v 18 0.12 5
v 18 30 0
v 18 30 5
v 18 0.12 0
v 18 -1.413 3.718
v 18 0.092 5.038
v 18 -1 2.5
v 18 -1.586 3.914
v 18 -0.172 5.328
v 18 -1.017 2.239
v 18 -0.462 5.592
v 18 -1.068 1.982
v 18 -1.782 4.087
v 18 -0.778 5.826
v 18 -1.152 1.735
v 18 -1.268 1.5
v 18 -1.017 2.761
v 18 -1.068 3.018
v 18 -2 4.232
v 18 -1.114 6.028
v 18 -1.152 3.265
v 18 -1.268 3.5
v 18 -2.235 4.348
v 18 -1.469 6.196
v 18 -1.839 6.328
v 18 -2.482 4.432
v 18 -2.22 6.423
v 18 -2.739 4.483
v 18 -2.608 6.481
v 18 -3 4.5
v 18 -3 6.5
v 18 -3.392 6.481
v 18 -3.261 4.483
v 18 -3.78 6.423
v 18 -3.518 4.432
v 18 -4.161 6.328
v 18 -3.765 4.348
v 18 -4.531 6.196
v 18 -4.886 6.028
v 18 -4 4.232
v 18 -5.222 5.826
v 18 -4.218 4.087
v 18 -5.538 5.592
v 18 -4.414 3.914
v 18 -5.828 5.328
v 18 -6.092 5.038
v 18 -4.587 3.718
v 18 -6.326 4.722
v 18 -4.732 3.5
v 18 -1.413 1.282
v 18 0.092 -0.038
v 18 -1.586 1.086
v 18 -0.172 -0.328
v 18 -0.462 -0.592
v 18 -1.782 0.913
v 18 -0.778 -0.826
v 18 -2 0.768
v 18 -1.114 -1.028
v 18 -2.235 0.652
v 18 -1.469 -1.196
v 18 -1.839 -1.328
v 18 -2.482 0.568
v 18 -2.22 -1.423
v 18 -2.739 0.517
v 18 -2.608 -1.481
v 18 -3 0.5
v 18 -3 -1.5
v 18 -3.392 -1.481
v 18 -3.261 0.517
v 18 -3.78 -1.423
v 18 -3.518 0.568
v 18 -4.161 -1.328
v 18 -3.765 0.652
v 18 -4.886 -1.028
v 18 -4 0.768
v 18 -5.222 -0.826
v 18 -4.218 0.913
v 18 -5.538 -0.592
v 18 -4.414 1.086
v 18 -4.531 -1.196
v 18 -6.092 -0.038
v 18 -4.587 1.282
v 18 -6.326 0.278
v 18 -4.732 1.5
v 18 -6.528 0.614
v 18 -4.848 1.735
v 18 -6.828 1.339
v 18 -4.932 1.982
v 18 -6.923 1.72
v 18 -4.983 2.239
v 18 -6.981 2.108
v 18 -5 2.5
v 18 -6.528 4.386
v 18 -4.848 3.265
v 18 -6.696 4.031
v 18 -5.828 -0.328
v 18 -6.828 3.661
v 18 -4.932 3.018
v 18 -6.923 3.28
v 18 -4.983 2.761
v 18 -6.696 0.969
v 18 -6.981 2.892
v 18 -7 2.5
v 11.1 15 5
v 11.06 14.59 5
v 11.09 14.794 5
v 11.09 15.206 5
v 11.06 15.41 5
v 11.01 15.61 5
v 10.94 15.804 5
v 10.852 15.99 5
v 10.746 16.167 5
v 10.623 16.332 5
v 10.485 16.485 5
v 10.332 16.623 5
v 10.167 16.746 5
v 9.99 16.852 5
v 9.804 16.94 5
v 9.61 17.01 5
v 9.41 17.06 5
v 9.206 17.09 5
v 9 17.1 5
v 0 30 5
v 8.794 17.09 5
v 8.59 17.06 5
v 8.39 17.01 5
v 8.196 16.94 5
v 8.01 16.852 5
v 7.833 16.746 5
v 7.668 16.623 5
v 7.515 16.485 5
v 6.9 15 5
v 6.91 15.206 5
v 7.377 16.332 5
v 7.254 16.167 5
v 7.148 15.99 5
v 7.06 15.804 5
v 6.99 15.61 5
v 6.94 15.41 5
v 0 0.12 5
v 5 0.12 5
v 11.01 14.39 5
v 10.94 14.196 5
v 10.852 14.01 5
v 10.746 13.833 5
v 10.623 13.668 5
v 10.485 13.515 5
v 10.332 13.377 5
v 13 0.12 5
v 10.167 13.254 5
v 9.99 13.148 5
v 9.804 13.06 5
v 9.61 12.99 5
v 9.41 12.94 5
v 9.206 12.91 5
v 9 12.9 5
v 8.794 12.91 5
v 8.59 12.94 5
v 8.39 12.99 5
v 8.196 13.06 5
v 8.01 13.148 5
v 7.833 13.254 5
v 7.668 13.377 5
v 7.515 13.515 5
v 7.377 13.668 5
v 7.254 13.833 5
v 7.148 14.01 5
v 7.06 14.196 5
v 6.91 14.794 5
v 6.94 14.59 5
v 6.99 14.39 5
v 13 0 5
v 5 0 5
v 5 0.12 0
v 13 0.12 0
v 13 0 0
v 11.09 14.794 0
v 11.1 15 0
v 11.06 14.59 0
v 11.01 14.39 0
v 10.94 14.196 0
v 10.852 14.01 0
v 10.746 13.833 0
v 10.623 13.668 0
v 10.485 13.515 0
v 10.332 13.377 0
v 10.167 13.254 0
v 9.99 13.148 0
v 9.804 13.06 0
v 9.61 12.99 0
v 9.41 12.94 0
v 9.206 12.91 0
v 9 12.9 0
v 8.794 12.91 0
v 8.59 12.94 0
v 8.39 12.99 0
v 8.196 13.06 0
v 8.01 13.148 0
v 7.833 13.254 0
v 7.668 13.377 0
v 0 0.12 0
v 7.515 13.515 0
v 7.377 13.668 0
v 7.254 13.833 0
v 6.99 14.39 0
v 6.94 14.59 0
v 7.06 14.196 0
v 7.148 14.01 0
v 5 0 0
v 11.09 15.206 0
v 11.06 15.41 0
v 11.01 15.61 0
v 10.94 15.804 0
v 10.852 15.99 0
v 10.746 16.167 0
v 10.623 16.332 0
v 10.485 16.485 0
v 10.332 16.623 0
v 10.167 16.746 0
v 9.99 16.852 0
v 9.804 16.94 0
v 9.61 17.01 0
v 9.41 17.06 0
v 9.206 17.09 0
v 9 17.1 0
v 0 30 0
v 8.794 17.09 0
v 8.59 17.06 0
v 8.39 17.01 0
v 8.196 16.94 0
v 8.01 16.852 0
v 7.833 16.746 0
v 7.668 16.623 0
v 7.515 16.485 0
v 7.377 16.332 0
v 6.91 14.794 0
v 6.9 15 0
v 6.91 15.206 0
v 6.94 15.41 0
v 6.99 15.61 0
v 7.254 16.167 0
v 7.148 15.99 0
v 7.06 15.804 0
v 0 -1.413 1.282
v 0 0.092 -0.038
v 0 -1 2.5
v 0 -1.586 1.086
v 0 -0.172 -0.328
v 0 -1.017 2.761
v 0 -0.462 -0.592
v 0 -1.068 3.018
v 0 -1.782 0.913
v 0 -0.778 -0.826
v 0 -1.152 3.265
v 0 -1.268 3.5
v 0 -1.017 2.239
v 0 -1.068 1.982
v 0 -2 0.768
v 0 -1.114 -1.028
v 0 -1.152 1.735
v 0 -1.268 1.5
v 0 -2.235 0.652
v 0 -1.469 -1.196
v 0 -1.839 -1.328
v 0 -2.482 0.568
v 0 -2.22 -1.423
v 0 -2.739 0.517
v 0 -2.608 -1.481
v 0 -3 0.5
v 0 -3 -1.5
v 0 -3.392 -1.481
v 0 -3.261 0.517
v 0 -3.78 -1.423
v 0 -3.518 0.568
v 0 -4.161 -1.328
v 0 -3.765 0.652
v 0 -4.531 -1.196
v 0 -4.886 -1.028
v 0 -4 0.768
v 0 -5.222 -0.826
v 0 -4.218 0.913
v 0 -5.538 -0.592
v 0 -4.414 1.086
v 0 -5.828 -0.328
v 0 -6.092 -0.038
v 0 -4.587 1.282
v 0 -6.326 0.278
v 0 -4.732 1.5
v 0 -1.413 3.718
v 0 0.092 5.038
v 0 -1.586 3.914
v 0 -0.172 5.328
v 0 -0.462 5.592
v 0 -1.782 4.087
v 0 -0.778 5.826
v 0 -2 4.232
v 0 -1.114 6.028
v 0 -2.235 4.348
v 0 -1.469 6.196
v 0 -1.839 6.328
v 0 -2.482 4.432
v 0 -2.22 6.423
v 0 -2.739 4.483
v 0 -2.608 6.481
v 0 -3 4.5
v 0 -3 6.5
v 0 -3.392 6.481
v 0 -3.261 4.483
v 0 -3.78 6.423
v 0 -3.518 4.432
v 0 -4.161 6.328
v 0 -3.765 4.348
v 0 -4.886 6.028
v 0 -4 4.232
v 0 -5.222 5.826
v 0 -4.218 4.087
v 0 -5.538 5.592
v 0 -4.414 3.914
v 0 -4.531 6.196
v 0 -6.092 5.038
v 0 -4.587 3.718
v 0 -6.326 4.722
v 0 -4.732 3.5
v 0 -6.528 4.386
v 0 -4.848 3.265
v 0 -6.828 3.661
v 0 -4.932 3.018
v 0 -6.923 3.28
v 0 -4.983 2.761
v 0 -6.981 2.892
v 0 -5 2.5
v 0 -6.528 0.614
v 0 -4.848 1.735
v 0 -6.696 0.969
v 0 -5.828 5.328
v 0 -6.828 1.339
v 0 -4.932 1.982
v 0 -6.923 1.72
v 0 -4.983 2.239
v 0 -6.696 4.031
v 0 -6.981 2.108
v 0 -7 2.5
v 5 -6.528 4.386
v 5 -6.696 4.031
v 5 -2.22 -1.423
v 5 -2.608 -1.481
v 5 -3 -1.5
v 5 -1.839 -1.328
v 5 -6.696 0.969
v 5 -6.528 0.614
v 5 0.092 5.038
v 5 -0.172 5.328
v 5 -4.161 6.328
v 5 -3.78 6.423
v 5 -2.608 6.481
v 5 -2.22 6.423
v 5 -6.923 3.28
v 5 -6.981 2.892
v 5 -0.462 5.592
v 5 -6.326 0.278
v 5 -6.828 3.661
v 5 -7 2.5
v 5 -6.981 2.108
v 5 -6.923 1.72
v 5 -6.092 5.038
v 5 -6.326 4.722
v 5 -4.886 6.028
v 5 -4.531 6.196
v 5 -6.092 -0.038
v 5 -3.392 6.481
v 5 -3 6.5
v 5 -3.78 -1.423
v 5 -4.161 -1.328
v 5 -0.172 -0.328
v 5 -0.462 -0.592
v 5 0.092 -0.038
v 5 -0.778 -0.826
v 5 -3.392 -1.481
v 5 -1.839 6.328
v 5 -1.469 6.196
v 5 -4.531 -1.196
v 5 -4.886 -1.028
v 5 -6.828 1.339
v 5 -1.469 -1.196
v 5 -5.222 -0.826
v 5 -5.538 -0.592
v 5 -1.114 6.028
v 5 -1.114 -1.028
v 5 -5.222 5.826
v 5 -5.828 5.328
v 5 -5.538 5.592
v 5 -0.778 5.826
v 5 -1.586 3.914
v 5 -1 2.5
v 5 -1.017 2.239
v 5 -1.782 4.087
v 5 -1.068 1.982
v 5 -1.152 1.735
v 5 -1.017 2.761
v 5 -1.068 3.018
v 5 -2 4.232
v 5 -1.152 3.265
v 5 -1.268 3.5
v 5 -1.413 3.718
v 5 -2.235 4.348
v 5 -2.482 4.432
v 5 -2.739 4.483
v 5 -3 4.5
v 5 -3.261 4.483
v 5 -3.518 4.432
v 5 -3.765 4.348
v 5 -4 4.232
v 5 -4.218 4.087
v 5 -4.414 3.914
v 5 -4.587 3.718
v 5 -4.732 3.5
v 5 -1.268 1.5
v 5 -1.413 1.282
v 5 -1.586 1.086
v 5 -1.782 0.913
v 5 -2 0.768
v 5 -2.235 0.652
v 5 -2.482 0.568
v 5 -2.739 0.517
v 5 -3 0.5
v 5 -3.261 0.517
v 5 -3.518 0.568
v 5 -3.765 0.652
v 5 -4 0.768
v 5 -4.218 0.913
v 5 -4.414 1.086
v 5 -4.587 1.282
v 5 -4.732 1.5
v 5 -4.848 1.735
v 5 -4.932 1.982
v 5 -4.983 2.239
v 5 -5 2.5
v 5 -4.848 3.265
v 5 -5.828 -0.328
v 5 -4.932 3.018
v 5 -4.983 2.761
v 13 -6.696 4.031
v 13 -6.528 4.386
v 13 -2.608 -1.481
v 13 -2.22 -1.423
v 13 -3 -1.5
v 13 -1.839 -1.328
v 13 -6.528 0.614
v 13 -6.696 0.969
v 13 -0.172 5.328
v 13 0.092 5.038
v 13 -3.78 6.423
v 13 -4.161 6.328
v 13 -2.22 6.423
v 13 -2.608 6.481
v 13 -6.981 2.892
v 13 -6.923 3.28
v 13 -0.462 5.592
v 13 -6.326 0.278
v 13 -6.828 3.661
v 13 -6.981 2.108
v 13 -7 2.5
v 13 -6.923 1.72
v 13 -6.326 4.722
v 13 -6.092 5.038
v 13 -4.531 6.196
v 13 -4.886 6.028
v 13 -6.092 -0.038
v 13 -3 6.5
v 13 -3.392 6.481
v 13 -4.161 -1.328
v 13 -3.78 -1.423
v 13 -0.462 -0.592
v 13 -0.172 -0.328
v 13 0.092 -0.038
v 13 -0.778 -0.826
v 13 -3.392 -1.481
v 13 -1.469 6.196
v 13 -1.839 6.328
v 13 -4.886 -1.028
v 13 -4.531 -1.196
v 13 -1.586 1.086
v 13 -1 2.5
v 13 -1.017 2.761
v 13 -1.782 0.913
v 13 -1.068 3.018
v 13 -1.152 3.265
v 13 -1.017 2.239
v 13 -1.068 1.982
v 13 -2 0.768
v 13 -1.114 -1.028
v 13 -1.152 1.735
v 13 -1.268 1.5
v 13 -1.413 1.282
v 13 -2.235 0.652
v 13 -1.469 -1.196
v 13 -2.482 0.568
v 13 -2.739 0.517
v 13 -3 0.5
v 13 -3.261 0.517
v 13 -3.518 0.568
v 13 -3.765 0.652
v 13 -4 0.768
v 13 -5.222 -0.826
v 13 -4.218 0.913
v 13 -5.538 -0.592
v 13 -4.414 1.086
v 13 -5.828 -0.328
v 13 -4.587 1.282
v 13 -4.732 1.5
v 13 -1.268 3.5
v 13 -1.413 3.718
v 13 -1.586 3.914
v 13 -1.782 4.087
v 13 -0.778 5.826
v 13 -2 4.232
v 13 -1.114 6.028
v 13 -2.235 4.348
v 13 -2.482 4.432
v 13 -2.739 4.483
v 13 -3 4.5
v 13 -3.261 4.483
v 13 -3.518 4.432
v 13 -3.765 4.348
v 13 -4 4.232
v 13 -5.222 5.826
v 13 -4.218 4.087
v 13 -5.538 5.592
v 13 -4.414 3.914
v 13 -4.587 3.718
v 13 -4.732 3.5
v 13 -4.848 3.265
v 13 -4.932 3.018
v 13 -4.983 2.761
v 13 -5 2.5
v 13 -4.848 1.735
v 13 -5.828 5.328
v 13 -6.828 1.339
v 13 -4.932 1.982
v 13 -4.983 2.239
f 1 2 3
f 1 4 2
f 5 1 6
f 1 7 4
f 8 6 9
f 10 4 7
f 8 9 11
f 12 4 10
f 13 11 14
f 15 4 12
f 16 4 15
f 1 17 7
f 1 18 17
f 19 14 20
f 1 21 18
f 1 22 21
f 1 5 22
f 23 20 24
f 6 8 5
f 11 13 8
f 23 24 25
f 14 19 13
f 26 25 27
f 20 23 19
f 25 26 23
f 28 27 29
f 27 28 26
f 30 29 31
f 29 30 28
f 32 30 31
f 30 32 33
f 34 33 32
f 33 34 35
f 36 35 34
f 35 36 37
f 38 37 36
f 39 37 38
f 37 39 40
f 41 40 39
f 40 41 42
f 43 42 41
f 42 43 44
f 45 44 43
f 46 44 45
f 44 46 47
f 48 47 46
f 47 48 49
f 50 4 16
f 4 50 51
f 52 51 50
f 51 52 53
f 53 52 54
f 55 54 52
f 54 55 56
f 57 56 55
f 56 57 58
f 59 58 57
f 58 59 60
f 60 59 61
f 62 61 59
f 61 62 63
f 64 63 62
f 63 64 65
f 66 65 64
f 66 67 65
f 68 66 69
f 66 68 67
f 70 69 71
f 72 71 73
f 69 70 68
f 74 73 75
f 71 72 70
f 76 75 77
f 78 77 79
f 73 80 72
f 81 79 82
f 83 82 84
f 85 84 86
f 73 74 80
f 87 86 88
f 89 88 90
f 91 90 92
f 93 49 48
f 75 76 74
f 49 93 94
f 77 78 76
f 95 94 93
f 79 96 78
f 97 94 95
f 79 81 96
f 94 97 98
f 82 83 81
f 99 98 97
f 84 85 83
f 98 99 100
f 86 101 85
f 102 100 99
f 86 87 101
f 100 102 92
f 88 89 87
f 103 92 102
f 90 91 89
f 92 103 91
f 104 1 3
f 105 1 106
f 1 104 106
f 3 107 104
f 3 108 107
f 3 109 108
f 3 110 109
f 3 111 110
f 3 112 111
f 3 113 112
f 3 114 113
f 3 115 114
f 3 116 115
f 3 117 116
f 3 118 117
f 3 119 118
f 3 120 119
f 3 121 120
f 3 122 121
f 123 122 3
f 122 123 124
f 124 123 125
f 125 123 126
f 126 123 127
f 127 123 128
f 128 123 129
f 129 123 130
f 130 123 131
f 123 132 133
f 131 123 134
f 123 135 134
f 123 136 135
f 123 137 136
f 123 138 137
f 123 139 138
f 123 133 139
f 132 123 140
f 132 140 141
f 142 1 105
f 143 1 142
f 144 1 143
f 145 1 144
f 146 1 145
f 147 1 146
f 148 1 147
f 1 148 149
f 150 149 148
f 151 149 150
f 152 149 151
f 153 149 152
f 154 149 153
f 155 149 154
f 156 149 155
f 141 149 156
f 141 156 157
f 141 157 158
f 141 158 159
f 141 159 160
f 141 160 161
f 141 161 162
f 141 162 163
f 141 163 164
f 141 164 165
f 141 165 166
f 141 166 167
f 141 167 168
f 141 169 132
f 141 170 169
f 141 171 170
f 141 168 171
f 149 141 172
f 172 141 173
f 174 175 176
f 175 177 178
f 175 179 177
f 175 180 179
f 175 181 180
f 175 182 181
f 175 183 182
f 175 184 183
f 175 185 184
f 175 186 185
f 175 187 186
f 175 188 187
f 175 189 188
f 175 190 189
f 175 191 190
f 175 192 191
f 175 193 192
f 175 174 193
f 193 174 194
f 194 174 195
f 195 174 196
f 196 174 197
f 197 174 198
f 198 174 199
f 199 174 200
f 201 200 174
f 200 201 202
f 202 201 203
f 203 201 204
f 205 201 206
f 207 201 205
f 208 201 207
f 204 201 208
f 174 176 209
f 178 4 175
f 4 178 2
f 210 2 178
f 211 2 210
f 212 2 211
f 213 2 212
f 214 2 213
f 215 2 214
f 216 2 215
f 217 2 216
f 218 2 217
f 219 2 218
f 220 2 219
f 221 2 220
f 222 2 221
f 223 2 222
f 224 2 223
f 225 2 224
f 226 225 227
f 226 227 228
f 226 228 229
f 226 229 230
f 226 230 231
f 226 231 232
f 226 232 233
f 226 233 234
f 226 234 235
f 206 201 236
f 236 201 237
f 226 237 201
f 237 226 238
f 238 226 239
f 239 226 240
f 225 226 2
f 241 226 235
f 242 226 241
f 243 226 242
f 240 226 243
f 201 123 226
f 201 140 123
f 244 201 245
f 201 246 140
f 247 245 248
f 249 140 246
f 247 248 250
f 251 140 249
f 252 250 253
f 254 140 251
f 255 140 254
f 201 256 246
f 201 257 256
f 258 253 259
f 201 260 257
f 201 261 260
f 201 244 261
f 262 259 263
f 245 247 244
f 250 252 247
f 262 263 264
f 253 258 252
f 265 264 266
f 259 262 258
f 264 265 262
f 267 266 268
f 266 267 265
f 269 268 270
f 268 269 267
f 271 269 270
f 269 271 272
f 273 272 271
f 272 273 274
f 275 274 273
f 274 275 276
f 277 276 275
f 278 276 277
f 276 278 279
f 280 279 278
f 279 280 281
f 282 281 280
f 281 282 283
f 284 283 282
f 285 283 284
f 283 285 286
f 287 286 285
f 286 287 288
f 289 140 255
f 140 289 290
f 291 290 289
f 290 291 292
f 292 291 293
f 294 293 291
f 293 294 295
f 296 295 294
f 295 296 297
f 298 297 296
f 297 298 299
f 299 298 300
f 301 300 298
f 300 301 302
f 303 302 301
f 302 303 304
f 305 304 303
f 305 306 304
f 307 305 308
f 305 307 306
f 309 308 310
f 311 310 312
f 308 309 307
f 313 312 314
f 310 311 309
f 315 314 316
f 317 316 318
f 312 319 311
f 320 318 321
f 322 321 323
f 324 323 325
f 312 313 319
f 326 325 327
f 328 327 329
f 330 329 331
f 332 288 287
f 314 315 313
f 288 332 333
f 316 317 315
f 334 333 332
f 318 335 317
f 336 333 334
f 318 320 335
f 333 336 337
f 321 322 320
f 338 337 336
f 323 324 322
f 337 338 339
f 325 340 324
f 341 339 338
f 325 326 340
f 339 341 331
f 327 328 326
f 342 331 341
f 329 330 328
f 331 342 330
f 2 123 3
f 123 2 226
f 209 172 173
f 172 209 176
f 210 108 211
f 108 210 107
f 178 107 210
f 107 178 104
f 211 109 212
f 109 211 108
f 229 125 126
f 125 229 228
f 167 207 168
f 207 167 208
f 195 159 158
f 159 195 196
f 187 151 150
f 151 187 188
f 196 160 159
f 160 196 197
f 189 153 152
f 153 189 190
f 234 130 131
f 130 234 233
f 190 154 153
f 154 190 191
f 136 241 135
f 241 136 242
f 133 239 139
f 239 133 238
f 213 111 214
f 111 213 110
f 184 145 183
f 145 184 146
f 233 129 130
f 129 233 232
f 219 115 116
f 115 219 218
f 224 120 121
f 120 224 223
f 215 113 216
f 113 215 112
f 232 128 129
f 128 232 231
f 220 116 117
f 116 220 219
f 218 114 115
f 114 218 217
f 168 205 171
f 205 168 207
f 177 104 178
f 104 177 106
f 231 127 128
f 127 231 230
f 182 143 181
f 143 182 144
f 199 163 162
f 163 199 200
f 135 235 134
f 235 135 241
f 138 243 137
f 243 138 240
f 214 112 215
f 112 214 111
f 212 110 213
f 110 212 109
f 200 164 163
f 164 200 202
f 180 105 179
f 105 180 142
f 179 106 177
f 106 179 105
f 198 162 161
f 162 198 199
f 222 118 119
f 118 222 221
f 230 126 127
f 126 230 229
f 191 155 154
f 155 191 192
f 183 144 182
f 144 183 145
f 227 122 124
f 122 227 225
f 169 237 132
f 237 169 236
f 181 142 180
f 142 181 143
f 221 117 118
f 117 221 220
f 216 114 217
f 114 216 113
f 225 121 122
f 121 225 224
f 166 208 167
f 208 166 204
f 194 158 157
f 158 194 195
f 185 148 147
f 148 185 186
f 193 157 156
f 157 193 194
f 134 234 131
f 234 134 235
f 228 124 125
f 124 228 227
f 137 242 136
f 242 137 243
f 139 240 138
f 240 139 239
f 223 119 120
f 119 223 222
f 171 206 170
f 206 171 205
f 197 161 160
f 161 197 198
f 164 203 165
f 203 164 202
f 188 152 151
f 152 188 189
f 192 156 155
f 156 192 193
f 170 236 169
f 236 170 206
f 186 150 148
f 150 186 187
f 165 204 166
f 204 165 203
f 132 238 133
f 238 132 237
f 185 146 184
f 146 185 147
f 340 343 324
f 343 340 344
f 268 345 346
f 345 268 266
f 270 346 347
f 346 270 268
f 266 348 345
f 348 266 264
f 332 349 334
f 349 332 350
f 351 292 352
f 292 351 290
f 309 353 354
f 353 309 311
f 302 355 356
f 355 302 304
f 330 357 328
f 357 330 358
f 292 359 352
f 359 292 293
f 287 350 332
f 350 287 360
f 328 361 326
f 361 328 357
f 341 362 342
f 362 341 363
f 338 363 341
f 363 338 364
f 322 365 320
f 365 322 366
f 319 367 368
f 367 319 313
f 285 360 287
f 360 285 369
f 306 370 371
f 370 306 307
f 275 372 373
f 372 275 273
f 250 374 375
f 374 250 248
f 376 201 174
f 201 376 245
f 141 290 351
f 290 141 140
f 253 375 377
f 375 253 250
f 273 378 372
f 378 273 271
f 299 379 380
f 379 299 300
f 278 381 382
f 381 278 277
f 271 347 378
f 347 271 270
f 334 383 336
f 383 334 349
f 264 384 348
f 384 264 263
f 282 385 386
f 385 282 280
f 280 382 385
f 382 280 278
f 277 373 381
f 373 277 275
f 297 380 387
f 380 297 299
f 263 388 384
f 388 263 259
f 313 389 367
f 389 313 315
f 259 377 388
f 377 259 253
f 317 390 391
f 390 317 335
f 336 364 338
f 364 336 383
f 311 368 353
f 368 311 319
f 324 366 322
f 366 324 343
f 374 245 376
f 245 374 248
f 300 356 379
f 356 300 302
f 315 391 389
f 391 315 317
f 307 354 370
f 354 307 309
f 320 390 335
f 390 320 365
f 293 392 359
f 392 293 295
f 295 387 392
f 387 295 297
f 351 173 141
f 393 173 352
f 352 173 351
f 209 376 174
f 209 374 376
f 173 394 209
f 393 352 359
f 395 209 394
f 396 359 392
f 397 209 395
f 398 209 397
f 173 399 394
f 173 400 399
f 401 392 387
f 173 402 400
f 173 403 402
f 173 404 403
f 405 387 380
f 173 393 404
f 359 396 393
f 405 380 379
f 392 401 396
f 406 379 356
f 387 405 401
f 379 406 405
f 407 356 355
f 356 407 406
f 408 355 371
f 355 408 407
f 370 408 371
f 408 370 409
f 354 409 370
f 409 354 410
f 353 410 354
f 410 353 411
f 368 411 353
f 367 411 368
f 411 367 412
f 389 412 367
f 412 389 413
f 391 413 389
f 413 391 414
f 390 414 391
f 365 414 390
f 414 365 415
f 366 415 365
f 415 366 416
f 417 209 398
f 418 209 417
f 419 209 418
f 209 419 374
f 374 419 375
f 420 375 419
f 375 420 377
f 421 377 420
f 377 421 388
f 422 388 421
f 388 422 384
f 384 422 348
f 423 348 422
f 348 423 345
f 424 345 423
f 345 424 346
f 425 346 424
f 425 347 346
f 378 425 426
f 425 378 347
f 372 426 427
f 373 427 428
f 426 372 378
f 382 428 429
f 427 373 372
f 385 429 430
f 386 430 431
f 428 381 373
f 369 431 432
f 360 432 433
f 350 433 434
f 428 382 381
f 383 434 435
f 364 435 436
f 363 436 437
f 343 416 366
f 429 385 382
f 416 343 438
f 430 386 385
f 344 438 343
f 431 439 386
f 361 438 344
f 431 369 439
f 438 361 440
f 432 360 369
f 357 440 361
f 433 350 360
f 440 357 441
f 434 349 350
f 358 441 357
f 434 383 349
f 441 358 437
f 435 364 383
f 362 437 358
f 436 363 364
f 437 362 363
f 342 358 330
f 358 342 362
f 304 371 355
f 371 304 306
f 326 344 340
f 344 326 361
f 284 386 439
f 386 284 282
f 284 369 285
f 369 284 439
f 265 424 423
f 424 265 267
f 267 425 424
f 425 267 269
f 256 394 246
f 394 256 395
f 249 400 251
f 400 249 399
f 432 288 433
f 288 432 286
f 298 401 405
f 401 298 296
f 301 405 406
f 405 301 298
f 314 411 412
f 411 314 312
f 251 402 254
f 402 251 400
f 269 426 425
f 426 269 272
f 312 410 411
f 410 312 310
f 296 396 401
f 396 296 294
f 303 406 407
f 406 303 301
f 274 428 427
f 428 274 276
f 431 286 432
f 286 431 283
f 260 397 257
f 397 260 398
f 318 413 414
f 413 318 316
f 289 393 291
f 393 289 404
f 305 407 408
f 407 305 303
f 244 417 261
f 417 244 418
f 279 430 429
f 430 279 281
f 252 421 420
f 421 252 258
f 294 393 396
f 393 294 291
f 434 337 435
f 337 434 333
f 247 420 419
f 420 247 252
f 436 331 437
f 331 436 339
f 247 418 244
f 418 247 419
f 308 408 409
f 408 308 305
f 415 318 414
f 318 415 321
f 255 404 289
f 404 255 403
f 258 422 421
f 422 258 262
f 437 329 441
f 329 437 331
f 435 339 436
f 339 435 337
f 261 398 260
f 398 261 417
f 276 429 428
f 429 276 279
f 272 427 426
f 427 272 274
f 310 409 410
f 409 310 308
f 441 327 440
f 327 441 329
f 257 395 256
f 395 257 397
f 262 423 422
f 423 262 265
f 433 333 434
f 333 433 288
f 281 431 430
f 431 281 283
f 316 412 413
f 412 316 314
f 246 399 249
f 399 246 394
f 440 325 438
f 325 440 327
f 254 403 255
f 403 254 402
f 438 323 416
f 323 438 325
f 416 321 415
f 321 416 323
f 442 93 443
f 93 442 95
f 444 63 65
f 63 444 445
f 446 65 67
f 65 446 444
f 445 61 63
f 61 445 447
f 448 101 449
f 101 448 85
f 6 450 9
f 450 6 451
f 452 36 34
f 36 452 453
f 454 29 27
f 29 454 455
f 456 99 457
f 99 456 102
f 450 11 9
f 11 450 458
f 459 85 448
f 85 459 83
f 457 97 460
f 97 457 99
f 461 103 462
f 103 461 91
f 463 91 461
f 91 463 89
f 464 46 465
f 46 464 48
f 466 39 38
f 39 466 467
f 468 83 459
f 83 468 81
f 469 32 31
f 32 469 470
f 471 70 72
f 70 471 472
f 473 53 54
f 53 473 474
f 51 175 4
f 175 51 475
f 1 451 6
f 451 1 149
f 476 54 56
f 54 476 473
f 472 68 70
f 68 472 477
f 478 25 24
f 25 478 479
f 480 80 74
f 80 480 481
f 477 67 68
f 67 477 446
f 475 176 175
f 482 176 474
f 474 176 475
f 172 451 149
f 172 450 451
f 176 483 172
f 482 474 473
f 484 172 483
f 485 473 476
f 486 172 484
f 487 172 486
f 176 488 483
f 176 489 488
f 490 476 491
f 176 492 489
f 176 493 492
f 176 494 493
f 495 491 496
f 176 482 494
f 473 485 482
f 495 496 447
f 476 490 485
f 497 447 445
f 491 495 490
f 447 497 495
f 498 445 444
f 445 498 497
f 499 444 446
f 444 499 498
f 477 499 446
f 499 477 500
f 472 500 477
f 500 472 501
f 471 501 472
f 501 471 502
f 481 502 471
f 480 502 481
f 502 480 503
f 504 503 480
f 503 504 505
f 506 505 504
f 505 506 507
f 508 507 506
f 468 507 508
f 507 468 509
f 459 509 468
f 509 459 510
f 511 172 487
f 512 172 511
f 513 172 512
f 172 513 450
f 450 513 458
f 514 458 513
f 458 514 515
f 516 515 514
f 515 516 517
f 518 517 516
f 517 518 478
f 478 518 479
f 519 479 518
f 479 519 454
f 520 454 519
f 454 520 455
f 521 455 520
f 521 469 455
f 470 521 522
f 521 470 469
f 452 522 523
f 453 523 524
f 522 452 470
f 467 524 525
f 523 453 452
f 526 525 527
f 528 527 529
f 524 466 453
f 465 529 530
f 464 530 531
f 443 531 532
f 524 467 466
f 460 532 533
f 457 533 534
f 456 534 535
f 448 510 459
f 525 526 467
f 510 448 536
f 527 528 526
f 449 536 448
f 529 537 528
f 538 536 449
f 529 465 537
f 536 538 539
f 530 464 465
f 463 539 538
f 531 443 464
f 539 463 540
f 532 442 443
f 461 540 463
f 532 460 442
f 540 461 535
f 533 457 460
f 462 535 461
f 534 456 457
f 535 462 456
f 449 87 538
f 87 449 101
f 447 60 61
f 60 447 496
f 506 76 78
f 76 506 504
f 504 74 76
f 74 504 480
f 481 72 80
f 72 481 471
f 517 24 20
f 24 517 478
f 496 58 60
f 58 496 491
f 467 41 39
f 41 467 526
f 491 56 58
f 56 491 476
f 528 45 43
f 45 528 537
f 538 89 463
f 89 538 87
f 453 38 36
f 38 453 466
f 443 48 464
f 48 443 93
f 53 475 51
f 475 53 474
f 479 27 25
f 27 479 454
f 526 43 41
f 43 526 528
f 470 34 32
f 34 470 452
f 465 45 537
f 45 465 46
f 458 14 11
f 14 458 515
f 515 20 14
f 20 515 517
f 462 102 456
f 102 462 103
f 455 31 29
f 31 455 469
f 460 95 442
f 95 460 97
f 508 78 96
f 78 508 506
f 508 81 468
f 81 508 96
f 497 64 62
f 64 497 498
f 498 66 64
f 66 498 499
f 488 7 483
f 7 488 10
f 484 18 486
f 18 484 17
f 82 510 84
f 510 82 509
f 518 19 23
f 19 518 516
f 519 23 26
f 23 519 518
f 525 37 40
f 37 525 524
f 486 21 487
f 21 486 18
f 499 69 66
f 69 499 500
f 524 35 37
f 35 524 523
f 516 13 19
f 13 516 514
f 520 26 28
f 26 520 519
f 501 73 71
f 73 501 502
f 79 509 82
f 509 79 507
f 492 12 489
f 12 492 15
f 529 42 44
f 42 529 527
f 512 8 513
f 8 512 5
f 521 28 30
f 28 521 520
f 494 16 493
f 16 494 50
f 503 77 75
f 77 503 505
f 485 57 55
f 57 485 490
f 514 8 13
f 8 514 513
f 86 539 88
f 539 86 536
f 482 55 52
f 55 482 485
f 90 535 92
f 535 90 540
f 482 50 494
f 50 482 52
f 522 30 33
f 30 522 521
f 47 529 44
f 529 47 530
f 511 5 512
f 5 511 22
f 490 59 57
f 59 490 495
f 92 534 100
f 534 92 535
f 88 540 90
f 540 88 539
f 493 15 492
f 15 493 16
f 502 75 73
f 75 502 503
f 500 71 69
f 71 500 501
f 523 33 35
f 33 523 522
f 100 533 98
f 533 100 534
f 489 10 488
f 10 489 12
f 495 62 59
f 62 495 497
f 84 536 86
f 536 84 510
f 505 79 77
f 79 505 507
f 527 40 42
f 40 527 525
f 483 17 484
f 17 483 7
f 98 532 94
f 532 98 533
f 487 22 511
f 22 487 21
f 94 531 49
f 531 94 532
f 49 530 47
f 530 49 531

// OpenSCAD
// --- Tấm phẳng 18x30mm, dày 5mm, có 1 lỗ M4 ở tâm và 2 khớp tròn có lỗ xuyên tâm ---
thickness = 5;
length = 18;
width = 30;
hole_dia = 4.2;       // lỗ bắt vít M4 (cho ốc lọt)
pin_dia = 4;        // lỗ xuyên tâm của khớp (cho đinh/pin)

// --- Thông số khớp ---
knuckle_dia = 8;      // đường kính ngoài khớp
knuckle_len = 5;      // chiều dài mỗi khớp (theo trục Y)
gap = 8;    // khoảng cách giữa 2 khớp = chiều dài khớp

// --- Tấm phẳng có 1 lỗ M4 ở giữa ---
difference() {
    cube([length, width, thickness], center = false);

    // Lỗ M4 ở đúng tâm tấm
    translate([length / 2, width / 2, 0])
        cylinder(h = thickness + 0.1, d = hole_dia, $fn = 64);
}

// --- Hai khớp tròn sát mép, cách nhau đều ---
for (i = [0:1]) {
    translate([
        i * (knuckle_len + gap),
        -3,                   // dính sát mép tấm
        thickness / 2         // nằm giữa bề dày
    ])
    rotate([0, 90, 0])
    difference() {
        // khối tròn bên ngoài
        cylinder(h = knuckle_len, d = knuckle_dia, $fn = 64);

        // lỗ xuyên tâm để luồn đinh/pin
        translate([0, 0, -1])
            cylinder(h = knuckle_len + 2, d = pin_dia, $fn = 48);
    }
}
